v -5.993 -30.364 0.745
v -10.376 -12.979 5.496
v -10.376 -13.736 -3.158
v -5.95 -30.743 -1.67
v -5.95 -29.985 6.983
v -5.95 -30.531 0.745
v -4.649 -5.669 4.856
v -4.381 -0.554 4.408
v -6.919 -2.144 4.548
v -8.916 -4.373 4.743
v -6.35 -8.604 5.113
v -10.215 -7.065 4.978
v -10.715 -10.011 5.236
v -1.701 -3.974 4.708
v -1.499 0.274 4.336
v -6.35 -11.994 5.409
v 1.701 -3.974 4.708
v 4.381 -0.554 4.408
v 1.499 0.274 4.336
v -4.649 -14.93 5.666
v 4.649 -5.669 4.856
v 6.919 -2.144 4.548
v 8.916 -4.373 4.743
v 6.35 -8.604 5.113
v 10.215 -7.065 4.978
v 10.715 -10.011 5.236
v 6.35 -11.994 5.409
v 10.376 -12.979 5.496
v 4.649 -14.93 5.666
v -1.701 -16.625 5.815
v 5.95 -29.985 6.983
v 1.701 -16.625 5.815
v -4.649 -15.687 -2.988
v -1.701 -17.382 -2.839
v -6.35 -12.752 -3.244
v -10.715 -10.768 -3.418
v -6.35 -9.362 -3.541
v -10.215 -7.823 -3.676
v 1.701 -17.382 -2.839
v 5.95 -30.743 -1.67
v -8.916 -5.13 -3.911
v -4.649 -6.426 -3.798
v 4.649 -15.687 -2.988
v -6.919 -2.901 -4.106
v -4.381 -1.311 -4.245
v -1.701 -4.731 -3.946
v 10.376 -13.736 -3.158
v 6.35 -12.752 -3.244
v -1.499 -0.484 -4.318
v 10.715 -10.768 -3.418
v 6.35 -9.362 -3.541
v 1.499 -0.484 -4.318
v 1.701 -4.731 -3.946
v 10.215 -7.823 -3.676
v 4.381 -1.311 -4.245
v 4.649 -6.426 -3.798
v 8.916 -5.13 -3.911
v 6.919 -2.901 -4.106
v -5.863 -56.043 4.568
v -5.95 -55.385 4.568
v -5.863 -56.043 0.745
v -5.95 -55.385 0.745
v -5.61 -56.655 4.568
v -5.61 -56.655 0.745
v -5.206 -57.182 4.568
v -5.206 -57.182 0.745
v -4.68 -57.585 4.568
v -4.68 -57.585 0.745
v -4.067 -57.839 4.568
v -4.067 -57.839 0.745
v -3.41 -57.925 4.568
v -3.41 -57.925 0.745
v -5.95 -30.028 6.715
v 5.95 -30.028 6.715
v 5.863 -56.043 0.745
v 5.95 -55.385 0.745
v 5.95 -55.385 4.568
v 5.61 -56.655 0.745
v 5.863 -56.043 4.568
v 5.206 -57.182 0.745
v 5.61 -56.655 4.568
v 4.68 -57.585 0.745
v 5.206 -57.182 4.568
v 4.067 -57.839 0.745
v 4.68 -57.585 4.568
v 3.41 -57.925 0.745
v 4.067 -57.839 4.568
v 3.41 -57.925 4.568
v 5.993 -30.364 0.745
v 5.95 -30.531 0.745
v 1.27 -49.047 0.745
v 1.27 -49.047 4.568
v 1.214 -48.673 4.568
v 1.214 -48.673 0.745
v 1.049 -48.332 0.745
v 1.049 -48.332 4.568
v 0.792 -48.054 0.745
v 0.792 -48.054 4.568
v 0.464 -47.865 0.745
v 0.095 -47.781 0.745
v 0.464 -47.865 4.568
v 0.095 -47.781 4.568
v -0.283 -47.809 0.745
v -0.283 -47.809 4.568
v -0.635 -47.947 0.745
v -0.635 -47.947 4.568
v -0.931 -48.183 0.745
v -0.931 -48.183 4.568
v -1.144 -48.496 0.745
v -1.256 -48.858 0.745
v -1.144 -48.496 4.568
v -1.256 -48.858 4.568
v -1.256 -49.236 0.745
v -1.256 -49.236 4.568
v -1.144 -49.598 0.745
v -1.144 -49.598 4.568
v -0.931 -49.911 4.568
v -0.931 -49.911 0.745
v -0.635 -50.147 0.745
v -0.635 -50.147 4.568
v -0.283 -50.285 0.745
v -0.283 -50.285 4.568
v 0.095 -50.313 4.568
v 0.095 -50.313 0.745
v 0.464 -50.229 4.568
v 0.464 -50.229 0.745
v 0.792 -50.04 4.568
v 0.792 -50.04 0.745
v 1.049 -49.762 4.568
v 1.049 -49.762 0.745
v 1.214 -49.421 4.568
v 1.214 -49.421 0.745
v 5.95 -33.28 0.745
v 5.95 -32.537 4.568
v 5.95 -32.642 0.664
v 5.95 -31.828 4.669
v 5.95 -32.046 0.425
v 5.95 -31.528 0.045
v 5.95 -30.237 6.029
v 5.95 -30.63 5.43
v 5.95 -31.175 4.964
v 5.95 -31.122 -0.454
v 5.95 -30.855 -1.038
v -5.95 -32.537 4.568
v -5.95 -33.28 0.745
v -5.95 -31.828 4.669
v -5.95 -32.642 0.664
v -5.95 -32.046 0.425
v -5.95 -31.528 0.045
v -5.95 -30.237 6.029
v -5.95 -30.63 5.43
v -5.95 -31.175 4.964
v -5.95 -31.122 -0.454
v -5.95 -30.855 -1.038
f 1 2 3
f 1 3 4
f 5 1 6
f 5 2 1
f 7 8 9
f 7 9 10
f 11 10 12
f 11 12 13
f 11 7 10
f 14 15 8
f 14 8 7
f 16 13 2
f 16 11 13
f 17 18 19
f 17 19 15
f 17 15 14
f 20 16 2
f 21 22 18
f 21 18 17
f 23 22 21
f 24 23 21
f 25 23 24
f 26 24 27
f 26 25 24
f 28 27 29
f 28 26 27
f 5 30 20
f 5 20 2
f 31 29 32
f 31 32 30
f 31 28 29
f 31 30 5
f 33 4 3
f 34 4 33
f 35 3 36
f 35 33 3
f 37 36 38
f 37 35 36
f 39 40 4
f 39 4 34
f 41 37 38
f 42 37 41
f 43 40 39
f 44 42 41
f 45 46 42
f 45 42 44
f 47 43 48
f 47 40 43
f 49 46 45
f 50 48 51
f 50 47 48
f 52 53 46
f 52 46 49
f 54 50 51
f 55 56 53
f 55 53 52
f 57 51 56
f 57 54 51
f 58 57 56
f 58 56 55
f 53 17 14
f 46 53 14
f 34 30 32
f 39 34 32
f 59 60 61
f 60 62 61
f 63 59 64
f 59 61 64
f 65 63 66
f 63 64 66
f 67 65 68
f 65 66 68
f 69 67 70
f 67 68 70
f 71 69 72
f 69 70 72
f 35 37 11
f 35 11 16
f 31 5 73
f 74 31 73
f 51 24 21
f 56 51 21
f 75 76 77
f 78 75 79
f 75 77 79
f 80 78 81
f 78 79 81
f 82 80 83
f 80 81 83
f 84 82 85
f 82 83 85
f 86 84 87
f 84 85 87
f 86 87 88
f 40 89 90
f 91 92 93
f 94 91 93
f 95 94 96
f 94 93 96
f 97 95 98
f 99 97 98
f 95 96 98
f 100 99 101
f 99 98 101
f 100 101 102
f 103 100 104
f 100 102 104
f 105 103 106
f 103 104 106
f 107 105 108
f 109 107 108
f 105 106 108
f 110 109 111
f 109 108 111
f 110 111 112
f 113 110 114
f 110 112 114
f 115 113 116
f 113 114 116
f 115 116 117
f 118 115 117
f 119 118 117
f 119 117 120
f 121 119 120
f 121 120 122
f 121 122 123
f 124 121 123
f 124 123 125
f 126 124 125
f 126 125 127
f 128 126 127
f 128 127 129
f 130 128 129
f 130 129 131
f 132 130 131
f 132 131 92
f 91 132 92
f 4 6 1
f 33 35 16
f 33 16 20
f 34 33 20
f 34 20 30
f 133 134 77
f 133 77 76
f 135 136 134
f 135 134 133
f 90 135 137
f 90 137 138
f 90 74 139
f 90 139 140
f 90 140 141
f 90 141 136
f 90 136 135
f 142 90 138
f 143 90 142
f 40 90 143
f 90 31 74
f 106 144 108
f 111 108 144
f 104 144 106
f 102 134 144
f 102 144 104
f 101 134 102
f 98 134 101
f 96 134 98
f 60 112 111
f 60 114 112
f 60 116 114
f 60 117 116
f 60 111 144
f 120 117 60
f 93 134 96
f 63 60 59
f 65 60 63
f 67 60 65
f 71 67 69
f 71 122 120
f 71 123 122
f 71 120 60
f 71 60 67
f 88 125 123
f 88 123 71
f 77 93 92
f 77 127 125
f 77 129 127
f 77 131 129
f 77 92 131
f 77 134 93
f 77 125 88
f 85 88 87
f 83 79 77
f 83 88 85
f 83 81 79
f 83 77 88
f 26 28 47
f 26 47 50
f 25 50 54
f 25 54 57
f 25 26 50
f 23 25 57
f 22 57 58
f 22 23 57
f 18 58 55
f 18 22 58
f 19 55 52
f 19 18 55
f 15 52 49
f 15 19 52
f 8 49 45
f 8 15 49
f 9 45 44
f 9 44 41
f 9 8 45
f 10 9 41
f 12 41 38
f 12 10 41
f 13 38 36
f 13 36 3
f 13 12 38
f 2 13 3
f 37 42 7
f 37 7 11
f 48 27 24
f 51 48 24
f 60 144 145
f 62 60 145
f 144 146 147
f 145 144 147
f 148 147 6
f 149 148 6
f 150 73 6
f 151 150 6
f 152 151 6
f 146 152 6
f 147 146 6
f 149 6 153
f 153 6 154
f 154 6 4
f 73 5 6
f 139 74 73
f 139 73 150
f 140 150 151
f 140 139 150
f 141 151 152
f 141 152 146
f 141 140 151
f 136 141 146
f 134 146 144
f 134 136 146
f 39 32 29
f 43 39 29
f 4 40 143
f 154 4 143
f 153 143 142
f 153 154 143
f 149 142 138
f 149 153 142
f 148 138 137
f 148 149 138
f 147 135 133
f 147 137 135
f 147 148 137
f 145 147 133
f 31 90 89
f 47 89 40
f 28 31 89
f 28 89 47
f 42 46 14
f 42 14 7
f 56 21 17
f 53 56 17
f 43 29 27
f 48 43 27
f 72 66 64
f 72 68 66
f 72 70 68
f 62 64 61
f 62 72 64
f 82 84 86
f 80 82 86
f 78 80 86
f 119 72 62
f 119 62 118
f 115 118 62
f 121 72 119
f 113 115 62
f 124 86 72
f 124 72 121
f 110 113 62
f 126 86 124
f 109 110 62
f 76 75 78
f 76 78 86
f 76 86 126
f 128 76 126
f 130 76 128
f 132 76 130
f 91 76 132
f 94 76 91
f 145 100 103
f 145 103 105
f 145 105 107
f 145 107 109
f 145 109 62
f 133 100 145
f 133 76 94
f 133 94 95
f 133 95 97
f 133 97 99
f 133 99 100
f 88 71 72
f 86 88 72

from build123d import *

# Parameters (mm, degrees)
BOSS_EXTRUDE1_DEPTH = 10.7188
SKETCH2_OUTSIDE_W   = 36.066
SKETCH2_OUTSIDE_H   = 73.696
CUT_EXTRUDE1_DEPTH  = 60.909415415
FILLET1_R           = 2.54
SKETCH6_R           = 1.27
CUT_EXTRUDE3_DEPTH  = 60.576572944
FILLET2_R           = 2.54


with BuildPart() as part:
    # Sketch1 → Boss-Extrude1 (new, symmetric)
    with BuildSketch(Plane(origin=(0, 0, 0), x_dir=(0, 0, -1), z_dir=(1, 0, 0))):
        Polygon((-4.567857039, -57.925462145), (-0.745157039, -57.925462145), (-0.745157039, -30.364014398), (1.670365013, -30.742566651), (4.326872052, -0.378552253), (-4.326872052, 0.378552253), (-6.983379091, -29.985462145), (-4.567857039, -30.364014398), align=None)
    extrude(amount=BOSS_EXTRUDE1_DEPTH, both=True)

    # Sketch2 outside → Cut-Extrude1 (cut, through all)
    # profile 1 of 2: a face of its own
    with BuildSketch(Plane(origin=(0, 0.378552253, 4.326872052), x_dir=(1, 0, 0), z_dir=(0, 0.08715574274765905, 0.9961946980917455))):
        with Locations((0, -28.78)):
            Rectangle(SKETCH2_OUTSIDE_W, SKETCH2_OUTSIDE_H)
        with BuildLine():
            Line((5.94995, -30.48), (10.375772253, -13.408785796))
            ThreePointArc((10.375772253, -13.408785796), (0, 0), (-10.375772253, -13.408785796))
            Line((-10.375772253, -13.408785796), (-5.94995, -30.48))
            Line((-5.94995, -30.48), (-5.94995, -58.103153246))
            Line((-5.94995, -58.103153246), (5.94995, -58.103153246))
            Line((5.94995, -58.103153246), (5.94995, -30.48))
        make_face(mode=Mode.SUBTRACT)
    # profile 2 of 2: a face of its own
    with BuildSketch(Plane(origin=(0, 0.378552253, 4.326872052), x_dir=(1, 0, 0), z_dir=(0, 0.08715574274765905, 0.9961946980917455))):
        Polygon((4.648522628, -6.070277372), (1.701477372, -4.3688), (-1.701477372, -4.3688), (-4.648522628, -6.070277372), (-6.35, -9.017322628), (-6.35, -12.420277372), (-4.648522628, -15.367322628), (-1.701477372, -17.0688), (1.701477372, -17.0688), (4.648522628, -15.367322628), (6.35, -12.420277372), (6.35, -9.017322628), align=None)
    extrude(amount=-CUT_EXTRUDE1_DEPTH, mode=Mode.SUBTRACT)

    # Fillet1
    # the kernel refuses this fillet: 2.54 mm, written as the material it adds along each edge
    with BuildSketch(Plane(origin=(-13.281888943, -30.364014398, 0.745157039), x_dir=(0, -0.15482679187338919, -0.9879416301169793), z_dir=(1, 0, 0))) as fillet1_piece_1_section:
        with BuildLine():
            CenterArc((2.960769294, -2.487084038), FILLET1_R, 101.715774122, 87.190976769)
            Line((0.451397554, -2.880344089), (0.401210119, -2.88820929))
            Line((0.401210119, -2.88820929), (-0.050187435, -0.007865201))
            Line((-0.050187435, -0.007865201), (0, 0.0508))
            ThreePointArc((0, 0.0508), (1.222502412, 0.0508), (2.434689535, 0.049741681))
            Line((2.434689535, 0.049741681), (2.445004824, 0))
        make_face()
    fillet1_piece_1 = extrude(amount=26.563777885, mode=Mode.PRIVATE)
    fillet1_piece_1 = split(fillet1_piece_1, bisect_by=Plane(origin=(-5.94995, -31.737023375, 0.445932994), z_dir=(1, 0, 0)), keep=Keep.TOP, mode=Mode.PRIVATE)
    fillet1_piece_1 = split(fillet1_piece_1, bisect_by=Plane(origin=(-5.654886332, -31.700159235, 0.4427078), z_dir=(-0.9679975606806361, -0.2500046262979335, 0.021872570630104494)), keep=Keep.TOP, mode=Mode.PRIVATE)
    add(fillet1_piece_1)
    with BuildSketch(Plane(origin=(-13.281888943, -30.364014398, 0.745157039), x_dir=(0, -0.15482679187338919, -0.9879416301169793), z_dir=(1, 0, 0))) as fillet1_piece_2_section:
        with BuildLine():
            CenterArc((2.960769294, -2.487084038), FILLET1_R, 101.715774122, 87.190976769)
            Line((0.451397554, -2.880344089), (0.401210119, -2.88820929))
            Line((0.401210119, -2.88820929), (-0.050187435, -0.007865201))
            Line((-0.050187435, -0.007865201), (0, 0.0508))
            ThreePointArc((0, 0.0508), (1.222502412, 0.0508), (2.434689535, 0.049741681))
            Line((2.434689535, 0.049741681), (2.445004824, 0))
        make_face()
    fillet1_piece_2 = extrude(amount=26.563777885, mode=Mode.PRIVATE)
    fillet1_piece_2 = split(fillet1_piece_2, bisect_by=Plane(origin=(-5.94995, -31.133883126, 0.125173685), z_dir=(1, 0, 0)), keep=Keep.TOP, mode=Mode.PRIVATE)
    fillet1_piece_2 = split(fillet1_piece_2, bisect_by=Plane(origin=(5.442501536, -32.539517415, 0.248150751), z_dir=(-0.967997560680636, 0.2500046262979333, -0.021872570630104476)), keep=Keep.TOP, mode=Mode.PRIVATE)
    fillet1_piece_2 = split(fillet1_piece_2, bisect_by=Plane(origin=(-5.442501536, -32.539517415, 0.248150751), z_dir=(0.9679975606806361, 0.2500046262979335, -0.021872570630104494)), keep=Keep.TOP, mode=Mode.PRIVATE)
    fillet1_piece_2 = split(fillet1_piece_2, bisect_by=Plane(origin=(5.94995, -31.133883126, 0.125173685), z_dir=(-1, 0, 0)), keep=Keep.TOP, mode=Mode.PRIVATE)
    add(fillet1_piece_2)
    with BuildSketch(Plane(origin=(-13.281888943, -30.364014398, 0.745157039), x_dir=(0, -0.15482679187338919, -0.9879416301169793), z_dir=(1, 0, 0))) as fillet1_piece_3_section:
        with BuildLine():
            CenterArc((2.960769294, -2.487084038), FILLET1_R, 101.715774122, 87.190976769)
            Line((0.451397554, -2.880344089), (0.401210119, -2.88820929))
            Line((0.401210119, -2.88820929), (-0.050187435, -0.007865201))
            Line((-0.050187435, -0.007865201), (0, 0.0508))
            ThreePointArc((0, 0.0508), (1.222502412, 0.0508), (2.434689535, 0.049741681))
            Line((2.434689535, 0.049741681), (2.445004824, 0))
        make_face()
    fillet1_piece_3 = extrude(amount=26.563777885, mode=Mode.PRIVATE)
    fillet1_piece_3 = split(fillet1_piece_3, bisect_by=Plane(origin=(-5.94995, -30.484623478, 0.0088191), z_dir=(-1, 0, 0)), keep=Keep.TOP, mode=Mode.PRIVATE)
    fillet1_piece_3 = split(fillet1_piece_3, bisect_by=Plane(origin=(-5.977723598, -30.488093407, 0.009122679), z_dir=(0.9679975606806361, 0.2500046262979335, -0.021872570630104494)), keep=Keep.TOP, mode=Mode.PRIVATE)
    add(fillet1_piece_3)
    with BuildSketch(Plane(origin=(-13.281888943, -30.364014398, 0.745157039), x_dir=(0, -0.15482679187338919, -0.9879416301169793), z_dir=(1, 0, 0))) as fillet1_piece_4_section:
        with BuildLine():
            CenterArc((2.960769294, -2.487084038), FILLET1_R, 101.715774122, 87.190976769)
            Line((0.451397554, -2.880344089), (0.401210119, -2.88820929))
            Line((0.401210119, -2.88820929), (-0.050187435, -0.007865201))
            Line((-0.050187435, -0.007865201), (0, 0.0508))
            ThreePointArc((0, 0.0508), (1.222502412, 0.0508), (2.434689535, 0.049741681))
            Line((2.434689535, 0.049741681), (2.445004824, 0))
        make_face()
    fillet1_piece_4 = extrude(amount=26.563777885, mode=Mode.PRIVATE)
    fillet1_piece_4 = split(fillet1_piece_4, bisect_by=Plane(origin=(5.654886332, -31.700159235, 0.4427078), z_dir=(0.967997560680636, -0.2500046262979333, 0.021872570630104476)), keep=Keep.TOP, mode=Mode.PRIVATE)
    fillet1_piece_4 = split(fillet1_piece_4, bisect_by=Plane(origin=(5.94995, -31.737023375, 0.445932994), z_dir=(-1, 0, 0)), keep=Keep.TOP, mode=Mode.PRIVATE)
    add(fillet1_piece_4)
    with BuildSketch(Plane(origin=(-13.281888943, -30.364014398, 0.745157039), x_dir=(0, -0.15482679187338919, -0.9879416301169793), z_dir=(1, 0, 0))) as fillet1_piece_5_section:
        with BuildLine():
            CenterArc((2.960769294, -2.487084038), FILLET1_R, 101.715774122, 87.190976769)
            Line((0.451397554, -2.880344089), (0.401210119, -2.88820929))
            Line((0.401210119, -2.88820929), (-0.050187435, -0.007865201))
            Line((-0.050187435, -0.007865201), (0, 0.0508))
            ThreePointArc((0, 0.0508), (1.222502412, 0.0508), (2.434689535, 0.049741681))
            Line((2.434689535, 0.049741681), (2.445004824, 0))
        make_face()
    fillet1_piece_5 = extrude(amount=26.563777885, mode=Mode.PRIVATE)
    fillet1_piece_5 = split(fillet1_piece_5, bisect_by=Plane(origin=(5.977723598, -30.488093407, 0.009122679), z_dir=(-0.967997560680636, 0.2500046262979333, -0.021872570630104476)), keep=Keep.TOP, mode=Mode.PRIVATE)
    fillet1_piece_5 = split(fillet1_piece_5, bisect_by=Plane(origin=(5.94995, -30.484623478, 0.0088191), z_dir=(1, 0, 0)), keep=Keep.TOP, mode=Mode.PRIVATE)
    add(fillet1_piece_5)
    with BuildSketch(Plane(origin=(5.94995, -30.364014398, 4.567857039), x_dir=(0, 0.15482679187338733, 0.9879416301169794), z_dir=(-1, 0, 0))) as fillet1_piece_6:
        with BuildLine():
            CenterArc((FILLET1_R * 0.855489011053, -FILLET1_R), FILLET1_R, 90, 81.093249109)
            Line((-FILLET1_R * 0.132452619064, -FILLET1_R * 0.845173208127), (-FILLET1_R * 0.152211451667, -FILLET1_R * 0.842076672289))
            Line((-FILLET1_R * 0.152211451667, -FILLET1_R * 0.842076672289), (-FILLET1_R * 0.0171097802211, FILLET1_R * 0.02))
            Line((-FILLET1_R * 0.0171097802211, FILLET1_R * 0.02), (FILLET1_R * 0.855489011053, FILLET1_R * 0.02))
            Line((FILLET1_R * 0.855489011053, FILLET1_R * 0.02), (FILLET1_R * 0.855489011053, 0))
        make_face()
    extrude(amount=11.8999)

    # Sketch6 → Cut-Extrude3 (cut, through all)
    with BuildSketch(Plane.XY.offset(4.567857039)):
        with Locations((0, -49.046956486)):
            Circle(SKETCH6_R)
    extrude(amount=-CUT_EXTRUDE3_DEPTH, mode=Mode.SUBTRACT)

    # Fillet2
    fillet2_edges = [part.edges().sort_by_distance(p)[0] for p in [
        (5.94995, -57.925462145, 2.656507039),
        (-5.94995, -57.925462145, 2.656507039),
    ]]
    fillet(fillet2_edges, radius=FILLET2_R)


solid = part.part
